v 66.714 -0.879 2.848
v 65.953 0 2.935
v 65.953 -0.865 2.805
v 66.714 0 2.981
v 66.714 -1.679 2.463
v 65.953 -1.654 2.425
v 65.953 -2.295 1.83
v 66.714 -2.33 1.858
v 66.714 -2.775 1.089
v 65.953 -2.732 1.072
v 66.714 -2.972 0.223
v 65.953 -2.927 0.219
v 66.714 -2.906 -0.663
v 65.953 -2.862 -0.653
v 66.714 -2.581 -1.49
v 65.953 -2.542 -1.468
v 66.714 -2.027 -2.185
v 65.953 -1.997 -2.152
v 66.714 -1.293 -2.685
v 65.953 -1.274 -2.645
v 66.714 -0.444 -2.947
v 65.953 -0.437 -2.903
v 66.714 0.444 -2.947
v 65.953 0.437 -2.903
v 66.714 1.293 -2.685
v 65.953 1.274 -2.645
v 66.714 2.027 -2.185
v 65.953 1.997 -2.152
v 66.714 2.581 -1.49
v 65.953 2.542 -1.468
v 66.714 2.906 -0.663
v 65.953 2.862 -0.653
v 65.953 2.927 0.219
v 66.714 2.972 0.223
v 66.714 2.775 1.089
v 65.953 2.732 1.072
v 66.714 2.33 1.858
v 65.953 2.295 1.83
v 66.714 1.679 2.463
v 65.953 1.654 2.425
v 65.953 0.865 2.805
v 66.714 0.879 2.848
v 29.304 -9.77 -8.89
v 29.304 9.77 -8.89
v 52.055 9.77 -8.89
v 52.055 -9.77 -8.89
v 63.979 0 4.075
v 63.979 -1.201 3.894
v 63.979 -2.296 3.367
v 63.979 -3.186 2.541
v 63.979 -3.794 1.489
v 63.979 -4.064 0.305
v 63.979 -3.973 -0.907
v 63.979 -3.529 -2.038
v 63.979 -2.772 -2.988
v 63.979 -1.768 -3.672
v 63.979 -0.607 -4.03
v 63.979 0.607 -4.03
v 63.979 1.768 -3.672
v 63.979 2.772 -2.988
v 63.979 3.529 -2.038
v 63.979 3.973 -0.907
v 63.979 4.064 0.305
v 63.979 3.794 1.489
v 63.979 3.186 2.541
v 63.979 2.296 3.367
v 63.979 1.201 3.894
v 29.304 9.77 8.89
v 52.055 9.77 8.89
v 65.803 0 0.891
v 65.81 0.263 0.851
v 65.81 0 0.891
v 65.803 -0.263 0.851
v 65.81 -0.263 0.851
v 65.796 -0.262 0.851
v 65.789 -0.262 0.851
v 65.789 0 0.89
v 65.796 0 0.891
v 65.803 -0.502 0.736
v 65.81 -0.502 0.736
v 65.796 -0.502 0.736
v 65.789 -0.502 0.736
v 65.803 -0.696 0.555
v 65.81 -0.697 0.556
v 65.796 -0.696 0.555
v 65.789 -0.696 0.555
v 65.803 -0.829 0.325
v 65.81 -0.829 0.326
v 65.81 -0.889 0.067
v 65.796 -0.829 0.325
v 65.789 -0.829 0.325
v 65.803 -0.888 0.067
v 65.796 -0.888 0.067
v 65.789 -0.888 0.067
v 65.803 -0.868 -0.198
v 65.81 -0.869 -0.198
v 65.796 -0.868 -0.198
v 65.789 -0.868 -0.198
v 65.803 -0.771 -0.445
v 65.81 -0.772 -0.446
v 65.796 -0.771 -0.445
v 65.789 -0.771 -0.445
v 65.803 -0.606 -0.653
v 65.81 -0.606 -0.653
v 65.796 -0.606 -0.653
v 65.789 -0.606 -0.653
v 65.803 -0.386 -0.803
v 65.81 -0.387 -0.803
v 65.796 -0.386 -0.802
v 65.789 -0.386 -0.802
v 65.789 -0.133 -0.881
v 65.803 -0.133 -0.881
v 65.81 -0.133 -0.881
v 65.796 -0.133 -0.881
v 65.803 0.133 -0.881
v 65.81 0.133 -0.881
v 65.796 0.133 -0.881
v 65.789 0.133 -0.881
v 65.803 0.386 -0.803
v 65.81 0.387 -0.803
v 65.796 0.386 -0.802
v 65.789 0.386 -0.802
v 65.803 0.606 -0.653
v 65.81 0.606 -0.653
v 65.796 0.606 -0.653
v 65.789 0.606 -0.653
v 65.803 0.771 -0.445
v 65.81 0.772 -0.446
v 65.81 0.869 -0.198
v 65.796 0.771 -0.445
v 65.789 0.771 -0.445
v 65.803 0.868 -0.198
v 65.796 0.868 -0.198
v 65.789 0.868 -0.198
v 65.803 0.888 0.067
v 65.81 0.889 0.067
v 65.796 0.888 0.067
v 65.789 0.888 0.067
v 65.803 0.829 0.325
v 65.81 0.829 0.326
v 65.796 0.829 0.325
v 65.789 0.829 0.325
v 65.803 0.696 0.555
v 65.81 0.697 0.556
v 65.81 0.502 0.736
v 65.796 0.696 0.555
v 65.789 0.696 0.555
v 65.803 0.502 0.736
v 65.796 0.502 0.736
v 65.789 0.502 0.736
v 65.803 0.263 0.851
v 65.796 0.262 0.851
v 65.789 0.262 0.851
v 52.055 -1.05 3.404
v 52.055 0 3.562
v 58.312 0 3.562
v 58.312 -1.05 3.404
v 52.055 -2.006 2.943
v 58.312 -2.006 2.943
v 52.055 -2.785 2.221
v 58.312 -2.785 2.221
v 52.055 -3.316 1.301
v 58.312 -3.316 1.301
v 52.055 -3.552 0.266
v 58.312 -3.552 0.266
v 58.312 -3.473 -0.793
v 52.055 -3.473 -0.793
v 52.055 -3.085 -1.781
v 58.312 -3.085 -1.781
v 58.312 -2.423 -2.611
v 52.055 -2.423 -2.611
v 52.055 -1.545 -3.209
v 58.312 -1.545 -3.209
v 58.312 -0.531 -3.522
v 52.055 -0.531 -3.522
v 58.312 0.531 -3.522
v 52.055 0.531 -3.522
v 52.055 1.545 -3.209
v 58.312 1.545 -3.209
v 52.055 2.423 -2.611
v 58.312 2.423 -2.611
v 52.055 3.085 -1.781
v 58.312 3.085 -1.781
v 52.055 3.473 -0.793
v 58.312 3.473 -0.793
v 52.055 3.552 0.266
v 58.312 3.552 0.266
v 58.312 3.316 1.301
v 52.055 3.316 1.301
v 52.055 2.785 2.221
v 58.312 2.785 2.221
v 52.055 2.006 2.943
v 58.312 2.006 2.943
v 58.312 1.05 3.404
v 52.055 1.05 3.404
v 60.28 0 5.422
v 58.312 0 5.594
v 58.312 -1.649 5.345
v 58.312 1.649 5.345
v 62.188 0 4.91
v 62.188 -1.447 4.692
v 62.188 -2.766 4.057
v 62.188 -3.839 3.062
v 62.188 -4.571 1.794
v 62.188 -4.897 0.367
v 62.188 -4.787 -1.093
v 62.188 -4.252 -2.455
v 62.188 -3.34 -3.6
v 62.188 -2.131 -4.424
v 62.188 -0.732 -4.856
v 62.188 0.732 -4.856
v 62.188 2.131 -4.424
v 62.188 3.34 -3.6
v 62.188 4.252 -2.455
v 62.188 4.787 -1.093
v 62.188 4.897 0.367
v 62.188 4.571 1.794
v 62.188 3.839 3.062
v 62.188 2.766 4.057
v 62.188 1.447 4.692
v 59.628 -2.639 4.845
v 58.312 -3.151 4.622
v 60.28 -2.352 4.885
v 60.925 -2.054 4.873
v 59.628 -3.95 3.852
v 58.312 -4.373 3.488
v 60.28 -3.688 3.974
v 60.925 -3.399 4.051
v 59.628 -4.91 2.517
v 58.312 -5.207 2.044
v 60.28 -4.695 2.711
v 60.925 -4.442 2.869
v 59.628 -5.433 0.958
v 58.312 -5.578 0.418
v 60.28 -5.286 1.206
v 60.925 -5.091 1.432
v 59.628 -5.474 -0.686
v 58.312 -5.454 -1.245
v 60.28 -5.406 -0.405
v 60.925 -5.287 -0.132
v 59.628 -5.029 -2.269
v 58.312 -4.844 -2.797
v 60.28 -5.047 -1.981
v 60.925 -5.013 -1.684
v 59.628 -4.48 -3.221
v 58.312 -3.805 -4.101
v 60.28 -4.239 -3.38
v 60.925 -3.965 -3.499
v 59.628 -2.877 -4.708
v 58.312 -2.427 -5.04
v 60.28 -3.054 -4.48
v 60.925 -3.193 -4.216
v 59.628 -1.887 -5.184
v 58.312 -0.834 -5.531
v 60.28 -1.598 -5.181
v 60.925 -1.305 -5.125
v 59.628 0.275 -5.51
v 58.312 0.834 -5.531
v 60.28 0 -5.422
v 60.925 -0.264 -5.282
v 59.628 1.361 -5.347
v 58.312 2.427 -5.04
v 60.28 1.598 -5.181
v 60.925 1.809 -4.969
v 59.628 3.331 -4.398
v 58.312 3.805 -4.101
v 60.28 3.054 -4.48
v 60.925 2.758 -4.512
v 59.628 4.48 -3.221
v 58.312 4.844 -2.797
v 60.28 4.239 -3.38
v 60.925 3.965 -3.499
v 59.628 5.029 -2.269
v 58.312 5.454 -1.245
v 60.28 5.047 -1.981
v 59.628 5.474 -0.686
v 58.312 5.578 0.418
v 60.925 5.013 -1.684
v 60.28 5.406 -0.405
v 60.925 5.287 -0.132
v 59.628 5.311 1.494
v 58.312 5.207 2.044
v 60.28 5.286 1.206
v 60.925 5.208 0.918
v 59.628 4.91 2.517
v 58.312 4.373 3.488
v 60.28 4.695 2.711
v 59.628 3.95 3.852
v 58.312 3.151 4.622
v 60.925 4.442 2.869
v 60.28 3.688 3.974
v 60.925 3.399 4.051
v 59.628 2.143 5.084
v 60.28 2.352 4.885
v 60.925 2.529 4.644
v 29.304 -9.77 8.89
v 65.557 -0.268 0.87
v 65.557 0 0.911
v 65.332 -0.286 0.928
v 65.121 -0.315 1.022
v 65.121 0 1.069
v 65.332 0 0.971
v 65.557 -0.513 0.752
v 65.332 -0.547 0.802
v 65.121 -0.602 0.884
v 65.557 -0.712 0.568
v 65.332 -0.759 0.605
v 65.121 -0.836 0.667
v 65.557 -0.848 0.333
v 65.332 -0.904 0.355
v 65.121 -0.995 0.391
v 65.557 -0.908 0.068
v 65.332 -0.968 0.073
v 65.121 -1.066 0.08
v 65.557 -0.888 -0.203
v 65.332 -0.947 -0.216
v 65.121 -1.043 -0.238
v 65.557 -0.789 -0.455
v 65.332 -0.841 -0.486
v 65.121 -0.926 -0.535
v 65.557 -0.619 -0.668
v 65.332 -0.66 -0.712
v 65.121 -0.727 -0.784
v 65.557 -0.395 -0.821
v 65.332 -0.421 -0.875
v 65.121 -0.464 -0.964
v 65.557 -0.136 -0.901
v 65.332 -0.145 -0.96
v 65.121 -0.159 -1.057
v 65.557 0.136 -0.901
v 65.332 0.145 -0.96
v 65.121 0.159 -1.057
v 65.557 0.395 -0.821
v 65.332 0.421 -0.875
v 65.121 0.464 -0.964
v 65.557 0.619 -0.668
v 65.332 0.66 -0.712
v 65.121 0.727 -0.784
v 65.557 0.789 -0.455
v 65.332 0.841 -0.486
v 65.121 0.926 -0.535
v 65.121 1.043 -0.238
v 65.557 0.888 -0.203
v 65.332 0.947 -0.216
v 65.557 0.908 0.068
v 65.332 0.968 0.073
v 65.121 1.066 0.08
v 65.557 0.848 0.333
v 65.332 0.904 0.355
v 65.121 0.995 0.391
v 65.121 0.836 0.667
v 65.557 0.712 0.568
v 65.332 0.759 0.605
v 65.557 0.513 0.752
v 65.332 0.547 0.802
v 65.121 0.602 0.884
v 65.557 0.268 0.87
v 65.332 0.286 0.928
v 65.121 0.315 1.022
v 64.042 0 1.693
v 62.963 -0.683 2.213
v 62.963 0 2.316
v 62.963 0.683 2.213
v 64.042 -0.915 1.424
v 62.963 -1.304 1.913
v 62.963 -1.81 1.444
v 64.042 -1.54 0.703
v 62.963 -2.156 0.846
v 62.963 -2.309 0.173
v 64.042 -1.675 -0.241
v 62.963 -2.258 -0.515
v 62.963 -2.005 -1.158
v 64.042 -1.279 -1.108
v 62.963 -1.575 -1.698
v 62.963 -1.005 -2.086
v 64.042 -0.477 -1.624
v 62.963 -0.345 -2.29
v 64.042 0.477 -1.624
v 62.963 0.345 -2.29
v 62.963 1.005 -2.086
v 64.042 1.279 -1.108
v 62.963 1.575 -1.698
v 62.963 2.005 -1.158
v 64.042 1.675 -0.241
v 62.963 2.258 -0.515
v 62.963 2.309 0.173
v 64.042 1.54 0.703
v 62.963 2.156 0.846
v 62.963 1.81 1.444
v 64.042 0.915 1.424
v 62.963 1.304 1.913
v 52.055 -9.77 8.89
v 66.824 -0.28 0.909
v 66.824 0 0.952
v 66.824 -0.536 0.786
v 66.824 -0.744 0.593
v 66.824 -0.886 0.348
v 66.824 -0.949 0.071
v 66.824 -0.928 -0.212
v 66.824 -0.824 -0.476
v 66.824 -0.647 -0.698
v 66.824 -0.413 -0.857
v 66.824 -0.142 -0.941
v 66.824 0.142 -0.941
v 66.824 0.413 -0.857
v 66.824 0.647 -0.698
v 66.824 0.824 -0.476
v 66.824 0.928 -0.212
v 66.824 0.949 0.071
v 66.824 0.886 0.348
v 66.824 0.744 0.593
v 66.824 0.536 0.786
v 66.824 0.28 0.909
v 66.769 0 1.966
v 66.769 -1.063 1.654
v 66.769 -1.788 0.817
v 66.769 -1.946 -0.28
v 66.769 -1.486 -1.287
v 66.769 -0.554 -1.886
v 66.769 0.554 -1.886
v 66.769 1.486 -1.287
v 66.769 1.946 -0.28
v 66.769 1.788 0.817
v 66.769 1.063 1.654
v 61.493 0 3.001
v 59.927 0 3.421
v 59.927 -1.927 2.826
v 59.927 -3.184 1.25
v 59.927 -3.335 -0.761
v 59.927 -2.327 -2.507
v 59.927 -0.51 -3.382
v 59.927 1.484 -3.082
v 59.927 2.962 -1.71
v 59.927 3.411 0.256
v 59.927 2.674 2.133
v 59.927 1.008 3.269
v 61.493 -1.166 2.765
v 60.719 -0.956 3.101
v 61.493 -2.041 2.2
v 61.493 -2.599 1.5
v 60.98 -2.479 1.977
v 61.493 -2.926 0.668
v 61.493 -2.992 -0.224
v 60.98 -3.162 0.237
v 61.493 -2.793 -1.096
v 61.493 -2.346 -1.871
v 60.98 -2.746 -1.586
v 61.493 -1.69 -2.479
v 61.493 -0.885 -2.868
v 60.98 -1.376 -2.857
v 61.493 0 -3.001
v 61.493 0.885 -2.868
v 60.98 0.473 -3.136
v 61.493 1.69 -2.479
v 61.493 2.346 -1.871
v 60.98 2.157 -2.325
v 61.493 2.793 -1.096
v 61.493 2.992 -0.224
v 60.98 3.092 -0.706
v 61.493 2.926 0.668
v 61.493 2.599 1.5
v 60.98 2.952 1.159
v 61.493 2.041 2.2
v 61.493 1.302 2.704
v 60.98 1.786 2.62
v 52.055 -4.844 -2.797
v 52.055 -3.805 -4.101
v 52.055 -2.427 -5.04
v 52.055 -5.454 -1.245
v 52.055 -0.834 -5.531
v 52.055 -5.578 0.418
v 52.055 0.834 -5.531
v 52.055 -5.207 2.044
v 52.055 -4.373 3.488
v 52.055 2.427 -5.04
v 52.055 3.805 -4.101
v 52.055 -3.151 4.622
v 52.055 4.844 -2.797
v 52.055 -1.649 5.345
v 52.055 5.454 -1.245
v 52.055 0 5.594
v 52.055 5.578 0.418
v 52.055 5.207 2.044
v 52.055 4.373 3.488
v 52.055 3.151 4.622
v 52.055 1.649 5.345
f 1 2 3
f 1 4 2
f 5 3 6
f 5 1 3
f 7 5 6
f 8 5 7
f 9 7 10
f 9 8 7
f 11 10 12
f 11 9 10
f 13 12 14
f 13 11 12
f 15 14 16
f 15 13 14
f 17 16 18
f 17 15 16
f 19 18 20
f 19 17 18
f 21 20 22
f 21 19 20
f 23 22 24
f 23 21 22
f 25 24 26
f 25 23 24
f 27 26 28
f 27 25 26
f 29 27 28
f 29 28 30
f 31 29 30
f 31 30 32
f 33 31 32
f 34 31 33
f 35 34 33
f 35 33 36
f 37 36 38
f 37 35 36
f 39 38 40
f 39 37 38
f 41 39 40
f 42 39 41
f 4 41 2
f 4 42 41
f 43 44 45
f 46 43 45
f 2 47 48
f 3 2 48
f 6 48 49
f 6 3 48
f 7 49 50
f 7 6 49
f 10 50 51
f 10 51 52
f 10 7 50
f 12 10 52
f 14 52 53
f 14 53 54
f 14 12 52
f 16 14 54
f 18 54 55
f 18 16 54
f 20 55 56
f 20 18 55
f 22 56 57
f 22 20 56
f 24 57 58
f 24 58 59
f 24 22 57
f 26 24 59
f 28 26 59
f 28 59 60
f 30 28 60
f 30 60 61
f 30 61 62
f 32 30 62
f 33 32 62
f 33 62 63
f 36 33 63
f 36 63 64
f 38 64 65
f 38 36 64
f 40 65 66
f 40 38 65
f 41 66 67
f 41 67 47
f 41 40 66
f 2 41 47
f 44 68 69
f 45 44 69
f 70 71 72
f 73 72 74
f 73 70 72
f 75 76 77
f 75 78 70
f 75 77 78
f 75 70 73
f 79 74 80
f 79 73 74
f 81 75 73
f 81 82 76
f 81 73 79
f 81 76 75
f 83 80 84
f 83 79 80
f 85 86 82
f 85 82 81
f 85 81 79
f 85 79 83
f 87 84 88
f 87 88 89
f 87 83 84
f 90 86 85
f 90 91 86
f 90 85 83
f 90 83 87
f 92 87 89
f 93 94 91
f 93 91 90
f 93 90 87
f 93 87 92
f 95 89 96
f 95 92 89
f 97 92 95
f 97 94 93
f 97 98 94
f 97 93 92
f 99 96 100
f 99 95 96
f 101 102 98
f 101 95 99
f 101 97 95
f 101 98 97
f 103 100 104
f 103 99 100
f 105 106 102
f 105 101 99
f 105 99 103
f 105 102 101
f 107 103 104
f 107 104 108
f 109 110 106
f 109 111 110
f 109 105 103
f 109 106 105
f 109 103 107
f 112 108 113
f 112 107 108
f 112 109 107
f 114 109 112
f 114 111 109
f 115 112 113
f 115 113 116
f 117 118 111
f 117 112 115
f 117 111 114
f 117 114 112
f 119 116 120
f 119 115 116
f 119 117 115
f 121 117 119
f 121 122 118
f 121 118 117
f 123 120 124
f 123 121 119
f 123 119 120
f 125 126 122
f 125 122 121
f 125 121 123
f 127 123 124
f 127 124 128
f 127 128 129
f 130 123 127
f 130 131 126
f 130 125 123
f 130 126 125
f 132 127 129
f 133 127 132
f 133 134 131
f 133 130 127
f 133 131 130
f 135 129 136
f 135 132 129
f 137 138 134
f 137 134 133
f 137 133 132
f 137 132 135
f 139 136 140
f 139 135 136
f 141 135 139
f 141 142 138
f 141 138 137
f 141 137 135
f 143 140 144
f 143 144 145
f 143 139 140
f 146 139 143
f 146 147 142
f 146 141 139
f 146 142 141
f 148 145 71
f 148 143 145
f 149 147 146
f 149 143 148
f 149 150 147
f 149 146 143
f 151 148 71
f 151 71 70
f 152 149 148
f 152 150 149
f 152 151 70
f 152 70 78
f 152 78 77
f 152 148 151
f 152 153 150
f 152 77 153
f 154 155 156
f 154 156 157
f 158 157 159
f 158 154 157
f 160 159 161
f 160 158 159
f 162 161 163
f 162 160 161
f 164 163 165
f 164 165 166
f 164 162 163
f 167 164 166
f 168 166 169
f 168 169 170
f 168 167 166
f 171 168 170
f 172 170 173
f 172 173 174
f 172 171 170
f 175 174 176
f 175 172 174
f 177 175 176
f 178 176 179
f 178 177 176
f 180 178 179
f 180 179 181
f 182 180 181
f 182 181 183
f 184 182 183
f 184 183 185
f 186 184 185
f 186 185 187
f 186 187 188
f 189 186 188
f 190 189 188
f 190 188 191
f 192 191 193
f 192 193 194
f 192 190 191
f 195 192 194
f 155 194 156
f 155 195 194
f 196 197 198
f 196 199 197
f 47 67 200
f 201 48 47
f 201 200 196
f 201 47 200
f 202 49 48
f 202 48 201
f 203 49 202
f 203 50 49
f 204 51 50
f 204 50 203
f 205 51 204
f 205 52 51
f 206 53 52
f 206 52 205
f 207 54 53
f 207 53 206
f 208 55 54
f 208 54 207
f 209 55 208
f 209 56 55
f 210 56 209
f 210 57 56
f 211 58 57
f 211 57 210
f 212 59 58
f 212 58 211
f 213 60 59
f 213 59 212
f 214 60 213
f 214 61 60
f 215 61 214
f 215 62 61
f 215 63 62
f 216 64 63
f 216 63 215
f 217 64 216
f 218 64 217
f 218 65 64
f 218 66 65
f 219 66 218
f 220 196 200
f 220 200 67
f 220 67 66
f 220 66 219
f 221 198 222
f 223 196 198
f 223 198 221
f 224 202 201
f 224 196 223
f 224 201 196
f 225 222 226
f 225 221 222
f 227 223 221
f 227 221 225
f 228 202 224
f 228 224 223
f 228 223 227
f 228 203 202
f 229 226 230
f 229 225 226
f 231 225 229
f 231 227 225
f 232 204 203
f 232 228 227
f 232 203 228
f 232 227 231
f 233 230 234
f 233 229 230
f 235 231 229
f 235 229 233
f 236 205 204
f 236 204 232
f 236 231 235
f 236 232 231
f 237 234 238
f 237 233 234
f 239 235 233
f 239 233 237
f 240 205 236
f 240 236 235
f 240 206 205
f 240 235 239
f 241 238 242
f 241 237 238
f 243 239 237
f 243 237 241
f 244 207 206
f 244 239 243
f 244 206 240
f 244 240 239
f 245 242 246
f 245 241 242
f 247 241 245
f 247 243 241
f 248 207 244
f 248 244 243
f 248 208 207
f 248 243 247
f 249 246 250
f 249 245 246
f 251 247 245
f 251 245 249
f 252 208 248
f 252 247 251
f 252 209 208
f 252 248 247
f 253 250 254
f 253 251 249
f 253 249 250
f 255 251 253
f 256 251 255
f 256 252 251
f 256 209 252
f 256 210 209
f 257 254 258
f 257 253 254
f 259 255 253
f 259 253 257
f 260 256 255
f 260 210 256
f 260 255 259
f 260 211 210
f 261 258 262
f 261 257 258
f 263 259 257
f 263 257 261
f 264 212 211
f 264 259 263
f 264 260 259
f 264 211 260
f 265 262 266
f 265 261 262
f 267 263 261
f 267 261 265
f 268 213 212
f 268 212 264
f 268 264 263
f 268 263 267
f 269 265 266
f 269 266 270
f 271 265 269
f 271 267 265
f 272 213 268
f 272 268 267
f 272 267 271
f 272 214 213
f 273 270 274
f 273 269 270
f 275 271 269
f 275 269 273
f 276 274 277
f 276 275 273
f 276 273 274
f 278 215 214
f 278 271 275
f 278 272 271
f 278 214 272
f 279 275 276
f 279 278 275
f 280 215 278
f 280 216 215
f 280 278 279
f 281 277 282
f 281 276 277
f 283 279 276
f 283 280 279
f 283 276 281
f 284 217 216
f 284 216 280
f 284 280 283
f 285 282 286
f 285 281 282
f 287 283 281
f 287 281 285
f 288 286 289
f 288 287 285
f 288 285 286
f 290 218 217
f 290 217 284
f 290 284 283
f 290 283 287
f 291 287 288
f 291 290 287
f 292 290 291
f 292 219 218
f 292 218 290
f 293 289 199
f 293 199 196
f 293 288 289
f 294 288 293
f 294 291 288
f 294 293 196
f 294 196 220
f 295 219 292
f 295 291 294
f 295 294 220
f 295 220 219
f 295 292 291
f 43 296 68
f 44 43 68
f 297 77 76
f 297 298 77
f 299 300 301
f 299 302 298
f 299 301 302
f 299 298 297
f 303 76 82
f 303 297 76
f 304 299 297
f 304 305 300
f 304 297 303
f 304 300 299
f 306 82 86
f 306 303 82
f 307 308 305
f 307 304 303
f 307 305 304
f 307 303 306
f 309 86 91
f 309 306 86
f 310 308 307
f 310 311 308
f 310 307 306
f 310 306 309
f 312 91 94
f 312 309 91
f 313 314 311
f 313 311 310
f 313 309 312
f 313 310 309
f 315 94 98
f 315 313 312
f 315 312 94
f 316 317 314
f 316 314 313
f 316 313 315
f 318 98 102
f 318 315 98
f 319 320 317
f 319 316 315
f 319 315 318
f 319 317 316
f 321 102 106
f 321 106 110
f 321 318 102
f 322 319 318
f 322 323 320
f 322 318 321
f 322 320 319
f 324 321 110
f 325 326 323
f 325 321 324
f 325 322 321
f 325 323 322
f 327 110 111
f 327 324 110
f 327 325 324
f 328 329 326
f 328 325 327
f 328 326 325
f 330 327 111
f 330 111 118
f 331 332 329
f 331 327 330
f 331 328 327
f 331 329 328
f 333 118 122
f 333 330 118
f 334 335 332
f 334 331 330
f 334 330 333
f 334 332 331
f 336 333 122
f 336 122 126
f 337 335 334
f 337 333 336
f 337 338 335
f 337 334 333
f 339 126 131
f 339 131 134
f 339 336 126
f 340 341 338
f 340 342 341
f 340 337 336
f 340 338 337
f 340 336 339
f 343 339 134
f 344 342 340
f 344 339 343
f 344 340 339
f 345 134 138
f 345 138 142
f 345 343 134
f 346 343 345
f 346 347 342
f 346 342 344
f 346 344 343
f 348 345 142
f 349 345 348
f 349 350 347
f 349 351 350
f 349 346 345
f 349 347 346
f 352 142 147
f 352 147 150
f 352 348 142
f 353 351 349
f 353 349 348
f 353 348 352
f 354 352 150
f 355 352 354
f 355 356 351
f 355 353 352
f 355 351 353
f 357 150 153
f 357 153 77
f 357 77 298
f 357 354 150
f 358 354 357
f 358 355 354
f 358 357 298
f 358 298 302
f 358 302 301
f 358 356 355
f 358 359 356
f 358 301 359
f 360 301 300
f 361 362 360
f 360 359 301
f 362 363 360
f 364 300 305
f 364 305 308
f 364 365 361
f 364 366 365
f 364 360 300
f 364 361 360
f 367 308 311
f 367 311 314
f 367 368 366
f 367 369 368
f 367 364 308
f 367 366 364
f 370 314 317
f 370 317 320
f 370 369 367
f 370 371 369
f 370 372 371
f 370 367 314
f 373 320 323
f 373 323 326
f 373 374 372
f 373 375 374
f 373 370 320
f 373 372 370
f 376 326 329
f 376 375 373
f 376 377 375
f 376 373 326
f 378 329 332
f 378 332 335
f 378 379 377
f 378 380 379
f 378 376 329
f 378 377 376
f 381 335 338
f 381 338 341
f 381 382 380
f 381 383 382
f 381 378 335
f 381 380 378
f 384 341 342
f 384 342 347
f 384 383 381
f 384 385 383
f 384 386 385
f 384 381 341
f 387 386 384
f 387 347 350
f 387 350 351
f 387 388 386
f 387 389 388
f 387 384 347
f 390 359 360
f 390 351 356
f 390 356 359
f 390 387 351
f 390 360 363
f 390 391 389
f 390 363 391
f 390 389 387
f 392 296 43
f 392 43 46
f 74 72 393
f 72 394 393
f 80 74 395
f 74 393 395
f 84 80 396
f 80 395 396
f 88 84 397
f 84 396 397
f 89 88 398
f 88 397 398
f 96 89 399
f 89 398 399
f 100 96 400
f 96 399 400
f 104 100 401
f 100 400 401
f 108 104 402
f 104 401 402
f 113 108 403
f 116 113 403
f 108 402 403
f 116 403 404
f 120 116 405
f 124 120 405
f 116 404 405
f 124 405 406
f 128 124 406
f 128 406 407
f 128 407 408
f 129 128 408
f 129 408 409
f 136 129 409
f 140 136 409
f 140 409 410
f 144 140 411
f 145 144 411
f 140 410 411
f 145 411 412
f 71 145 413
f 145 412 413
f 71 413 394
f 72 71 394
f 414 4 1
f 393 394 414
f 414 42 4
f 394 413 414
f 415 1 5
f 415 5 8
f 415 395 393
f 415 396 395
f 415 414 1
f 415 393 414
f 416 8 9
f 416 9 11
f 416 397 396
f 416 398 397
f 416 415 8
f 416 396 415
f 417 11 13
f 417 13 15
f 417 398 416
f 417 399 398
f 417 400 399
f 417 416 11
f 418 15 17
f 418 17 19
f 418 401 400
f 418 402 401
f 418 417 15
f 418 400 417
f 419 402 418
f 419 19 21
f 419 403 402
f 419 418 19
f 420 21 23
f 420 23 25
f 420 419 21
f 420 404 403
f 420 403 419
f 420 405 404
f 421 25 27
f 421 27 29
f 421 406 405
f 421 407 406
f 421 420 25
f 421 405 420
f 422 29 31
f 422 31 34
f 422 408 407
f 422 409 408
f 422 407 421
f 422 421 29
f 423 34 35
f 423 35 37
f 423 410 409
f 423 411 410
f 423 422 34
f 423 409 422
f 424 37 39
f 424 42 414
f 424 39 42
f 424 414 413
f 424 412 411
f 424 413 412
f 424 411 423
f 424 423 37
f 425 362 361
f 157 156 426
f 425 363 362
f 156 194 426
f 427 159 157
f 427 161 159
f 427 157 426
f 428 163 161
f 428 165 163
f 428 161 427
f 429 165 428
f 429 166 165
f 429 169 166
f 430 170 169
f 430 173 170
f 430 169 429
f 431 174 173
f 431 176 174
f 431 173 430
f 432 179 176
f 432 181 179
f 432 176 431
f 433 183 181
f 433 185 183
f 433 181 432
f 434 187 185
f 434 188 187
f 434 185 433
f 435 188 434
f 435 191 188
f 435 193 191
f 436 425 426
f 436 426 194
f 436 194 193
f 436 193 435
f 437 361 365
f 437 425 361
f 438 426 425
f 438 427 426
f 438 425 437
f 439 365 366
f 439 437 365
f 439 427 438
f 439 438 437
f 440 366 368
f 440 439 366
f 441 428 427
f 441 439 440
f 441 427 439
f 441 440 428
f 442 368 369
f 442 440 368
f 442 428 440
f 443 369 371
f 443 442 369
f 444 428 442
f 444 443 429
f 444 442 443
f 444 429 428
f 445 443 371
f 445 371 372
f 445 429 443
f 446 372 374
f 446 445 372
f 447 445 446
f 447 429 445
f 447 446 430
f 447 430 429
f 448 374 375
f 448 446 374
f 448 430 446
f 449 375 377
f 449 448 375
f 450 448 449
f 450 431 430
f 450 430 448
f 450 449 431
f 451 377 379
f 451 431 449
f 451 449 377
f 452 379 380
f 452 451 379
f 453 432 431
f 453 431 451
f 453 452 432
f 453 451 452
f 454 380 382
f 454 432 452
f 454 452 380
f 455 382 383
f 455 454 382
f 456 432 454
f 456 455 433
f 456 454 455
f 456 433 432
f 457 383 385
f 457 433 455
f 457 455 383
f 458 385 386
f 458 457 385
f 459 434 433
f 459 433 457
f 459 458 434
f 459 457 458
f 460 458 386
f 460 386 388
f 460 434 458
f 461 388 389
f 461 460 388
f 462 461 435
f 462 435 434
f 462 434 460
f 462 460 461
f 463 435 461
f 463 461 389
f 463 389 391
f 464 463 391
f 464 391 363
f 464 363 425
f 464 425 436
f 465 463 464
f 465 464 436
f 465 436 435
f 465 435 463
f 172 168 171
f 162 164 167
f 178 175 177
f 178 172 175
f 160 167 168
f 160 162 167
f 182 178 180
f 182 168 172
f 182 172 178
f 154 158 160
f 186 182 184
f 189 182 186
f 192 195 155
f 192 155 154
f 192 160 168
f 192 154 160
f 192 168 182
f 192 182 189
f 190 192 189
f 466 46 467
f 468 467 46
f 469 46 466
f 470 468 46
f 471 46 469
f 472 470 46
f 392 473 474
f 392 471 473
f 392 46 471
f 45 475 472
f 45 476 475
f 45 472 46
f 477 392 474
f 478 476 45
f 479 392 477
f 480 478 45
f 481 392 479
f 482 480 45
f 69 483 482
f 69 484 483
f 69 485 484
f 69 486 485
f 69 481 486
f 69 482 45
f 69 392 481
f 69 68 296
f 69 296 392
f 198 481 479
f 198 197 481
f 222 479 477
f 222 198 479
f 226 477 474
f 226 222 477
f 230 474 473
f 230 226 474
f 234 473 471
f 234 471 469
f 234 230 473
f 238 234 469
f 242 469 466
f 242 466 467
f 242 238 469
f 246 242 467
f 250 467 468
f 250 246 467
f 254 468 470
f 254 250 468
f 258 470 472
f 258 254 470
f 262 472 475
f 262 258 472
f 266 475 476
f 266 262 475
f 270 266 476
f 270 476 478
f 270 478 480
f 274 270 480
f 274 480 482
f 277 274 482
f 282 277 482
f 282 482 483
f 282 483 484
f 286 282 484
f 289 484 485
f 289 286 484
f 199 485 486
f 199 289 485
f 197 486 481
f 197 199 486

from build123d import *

# Parameters (mm, degrees)
SKETCH1_W           = 52.054588137
SKETCH1_H           = 19.540614726
BOSS_EXTRUDE1_DEPTH = 8.89
SKETCH3_W           = 29.304045921
SKETCH3_H           = 19.540614726
CUT_EXTRUDE1_DEPTH  = 70.835641623


with BuildPart() as part:
    # Model → Revolve1 (revolve)
    with BuildSketch(Plane.XY, mode=Mode.PRIVATE) as revolve1_sk:
        with BuildLine():
            add(Edge.make_bspline(
                [(65.953268304, 2.93538911), (66.613970922, 2.97512211), (66.714344102, 2.980580933)],
                knots=[0.156174428, 0.156174428, 0.156174428, 1, 1, 1], degree=2))
            Line((66.714344102, 2.980580933), (66.8238694, 0.9515348))
            add(Edge.make_bspline(
                [(65.809518177, 0.891062762), (66.723641, 0.9461246), (66.8238694, 0.9515348)],
                knots=[0, 0, 0, 1, 1, 1], degree=2))
            ThreePointArc((65.809518177, 0.891062762), (65.799300412, 0.890601575), (65.7890734, 0.8904478))
            ThreePointArc((65.7890734, 0.8904478), (65.443371388, 0.935970102), (65.1212312, 1.0694162))
            Line((65.1212312, 1.0694162), (62.962634994, 2.315661898))
            ThreePointArc((62.962634994, 2.315661898), (60.719228535, 3.244897306), (58.3117616, 3.561842))
            Line((58.3117616, 3.561842), (0, 3.561842))
            Line((0, 3.561842), (0, 5.593842))
            Line((0, 5.593842), (58.3117616, 5.593842))
            ThreePointArc((58.3117616, 5.593842), (61.245141878, 5.207660449), (63.978622519, 4.075432721))
            Line((63.978622519, 4.075432721), (65.953268304, 2.93538911))
        make_face()
    revolve(revolve1_sk.sketch.rotate(Axis((0, 0, 0), (1, 0, 0)), 90), axis=Axis((0, 0, 0), (1, 0, 0)))

    # Sketch1 → Boss-Extrude1 (add, symmetric)
    with BuildSketch(Plane.XY):
        with Locations((26.027294069, 0)):
            Rectangle(SKETCH1_W, SKETCH1_H)
    extrude(amount=BOSS_EXTRUDE1_DEPTH, both=True)

    # Sketch3 → Cut-Extrude1 (cut, through all)
    with BuildSketch(Plane.XY.offset(8.89)):
        with Locations((14.652022961, 0)):
            Rectangle(SKETCH3_W, SKETCH3_H)
    extrude(amount=-CUT_EXTRUDE1_DEPTH, mode=Mode.SUBTRACT)


solid = part.part
